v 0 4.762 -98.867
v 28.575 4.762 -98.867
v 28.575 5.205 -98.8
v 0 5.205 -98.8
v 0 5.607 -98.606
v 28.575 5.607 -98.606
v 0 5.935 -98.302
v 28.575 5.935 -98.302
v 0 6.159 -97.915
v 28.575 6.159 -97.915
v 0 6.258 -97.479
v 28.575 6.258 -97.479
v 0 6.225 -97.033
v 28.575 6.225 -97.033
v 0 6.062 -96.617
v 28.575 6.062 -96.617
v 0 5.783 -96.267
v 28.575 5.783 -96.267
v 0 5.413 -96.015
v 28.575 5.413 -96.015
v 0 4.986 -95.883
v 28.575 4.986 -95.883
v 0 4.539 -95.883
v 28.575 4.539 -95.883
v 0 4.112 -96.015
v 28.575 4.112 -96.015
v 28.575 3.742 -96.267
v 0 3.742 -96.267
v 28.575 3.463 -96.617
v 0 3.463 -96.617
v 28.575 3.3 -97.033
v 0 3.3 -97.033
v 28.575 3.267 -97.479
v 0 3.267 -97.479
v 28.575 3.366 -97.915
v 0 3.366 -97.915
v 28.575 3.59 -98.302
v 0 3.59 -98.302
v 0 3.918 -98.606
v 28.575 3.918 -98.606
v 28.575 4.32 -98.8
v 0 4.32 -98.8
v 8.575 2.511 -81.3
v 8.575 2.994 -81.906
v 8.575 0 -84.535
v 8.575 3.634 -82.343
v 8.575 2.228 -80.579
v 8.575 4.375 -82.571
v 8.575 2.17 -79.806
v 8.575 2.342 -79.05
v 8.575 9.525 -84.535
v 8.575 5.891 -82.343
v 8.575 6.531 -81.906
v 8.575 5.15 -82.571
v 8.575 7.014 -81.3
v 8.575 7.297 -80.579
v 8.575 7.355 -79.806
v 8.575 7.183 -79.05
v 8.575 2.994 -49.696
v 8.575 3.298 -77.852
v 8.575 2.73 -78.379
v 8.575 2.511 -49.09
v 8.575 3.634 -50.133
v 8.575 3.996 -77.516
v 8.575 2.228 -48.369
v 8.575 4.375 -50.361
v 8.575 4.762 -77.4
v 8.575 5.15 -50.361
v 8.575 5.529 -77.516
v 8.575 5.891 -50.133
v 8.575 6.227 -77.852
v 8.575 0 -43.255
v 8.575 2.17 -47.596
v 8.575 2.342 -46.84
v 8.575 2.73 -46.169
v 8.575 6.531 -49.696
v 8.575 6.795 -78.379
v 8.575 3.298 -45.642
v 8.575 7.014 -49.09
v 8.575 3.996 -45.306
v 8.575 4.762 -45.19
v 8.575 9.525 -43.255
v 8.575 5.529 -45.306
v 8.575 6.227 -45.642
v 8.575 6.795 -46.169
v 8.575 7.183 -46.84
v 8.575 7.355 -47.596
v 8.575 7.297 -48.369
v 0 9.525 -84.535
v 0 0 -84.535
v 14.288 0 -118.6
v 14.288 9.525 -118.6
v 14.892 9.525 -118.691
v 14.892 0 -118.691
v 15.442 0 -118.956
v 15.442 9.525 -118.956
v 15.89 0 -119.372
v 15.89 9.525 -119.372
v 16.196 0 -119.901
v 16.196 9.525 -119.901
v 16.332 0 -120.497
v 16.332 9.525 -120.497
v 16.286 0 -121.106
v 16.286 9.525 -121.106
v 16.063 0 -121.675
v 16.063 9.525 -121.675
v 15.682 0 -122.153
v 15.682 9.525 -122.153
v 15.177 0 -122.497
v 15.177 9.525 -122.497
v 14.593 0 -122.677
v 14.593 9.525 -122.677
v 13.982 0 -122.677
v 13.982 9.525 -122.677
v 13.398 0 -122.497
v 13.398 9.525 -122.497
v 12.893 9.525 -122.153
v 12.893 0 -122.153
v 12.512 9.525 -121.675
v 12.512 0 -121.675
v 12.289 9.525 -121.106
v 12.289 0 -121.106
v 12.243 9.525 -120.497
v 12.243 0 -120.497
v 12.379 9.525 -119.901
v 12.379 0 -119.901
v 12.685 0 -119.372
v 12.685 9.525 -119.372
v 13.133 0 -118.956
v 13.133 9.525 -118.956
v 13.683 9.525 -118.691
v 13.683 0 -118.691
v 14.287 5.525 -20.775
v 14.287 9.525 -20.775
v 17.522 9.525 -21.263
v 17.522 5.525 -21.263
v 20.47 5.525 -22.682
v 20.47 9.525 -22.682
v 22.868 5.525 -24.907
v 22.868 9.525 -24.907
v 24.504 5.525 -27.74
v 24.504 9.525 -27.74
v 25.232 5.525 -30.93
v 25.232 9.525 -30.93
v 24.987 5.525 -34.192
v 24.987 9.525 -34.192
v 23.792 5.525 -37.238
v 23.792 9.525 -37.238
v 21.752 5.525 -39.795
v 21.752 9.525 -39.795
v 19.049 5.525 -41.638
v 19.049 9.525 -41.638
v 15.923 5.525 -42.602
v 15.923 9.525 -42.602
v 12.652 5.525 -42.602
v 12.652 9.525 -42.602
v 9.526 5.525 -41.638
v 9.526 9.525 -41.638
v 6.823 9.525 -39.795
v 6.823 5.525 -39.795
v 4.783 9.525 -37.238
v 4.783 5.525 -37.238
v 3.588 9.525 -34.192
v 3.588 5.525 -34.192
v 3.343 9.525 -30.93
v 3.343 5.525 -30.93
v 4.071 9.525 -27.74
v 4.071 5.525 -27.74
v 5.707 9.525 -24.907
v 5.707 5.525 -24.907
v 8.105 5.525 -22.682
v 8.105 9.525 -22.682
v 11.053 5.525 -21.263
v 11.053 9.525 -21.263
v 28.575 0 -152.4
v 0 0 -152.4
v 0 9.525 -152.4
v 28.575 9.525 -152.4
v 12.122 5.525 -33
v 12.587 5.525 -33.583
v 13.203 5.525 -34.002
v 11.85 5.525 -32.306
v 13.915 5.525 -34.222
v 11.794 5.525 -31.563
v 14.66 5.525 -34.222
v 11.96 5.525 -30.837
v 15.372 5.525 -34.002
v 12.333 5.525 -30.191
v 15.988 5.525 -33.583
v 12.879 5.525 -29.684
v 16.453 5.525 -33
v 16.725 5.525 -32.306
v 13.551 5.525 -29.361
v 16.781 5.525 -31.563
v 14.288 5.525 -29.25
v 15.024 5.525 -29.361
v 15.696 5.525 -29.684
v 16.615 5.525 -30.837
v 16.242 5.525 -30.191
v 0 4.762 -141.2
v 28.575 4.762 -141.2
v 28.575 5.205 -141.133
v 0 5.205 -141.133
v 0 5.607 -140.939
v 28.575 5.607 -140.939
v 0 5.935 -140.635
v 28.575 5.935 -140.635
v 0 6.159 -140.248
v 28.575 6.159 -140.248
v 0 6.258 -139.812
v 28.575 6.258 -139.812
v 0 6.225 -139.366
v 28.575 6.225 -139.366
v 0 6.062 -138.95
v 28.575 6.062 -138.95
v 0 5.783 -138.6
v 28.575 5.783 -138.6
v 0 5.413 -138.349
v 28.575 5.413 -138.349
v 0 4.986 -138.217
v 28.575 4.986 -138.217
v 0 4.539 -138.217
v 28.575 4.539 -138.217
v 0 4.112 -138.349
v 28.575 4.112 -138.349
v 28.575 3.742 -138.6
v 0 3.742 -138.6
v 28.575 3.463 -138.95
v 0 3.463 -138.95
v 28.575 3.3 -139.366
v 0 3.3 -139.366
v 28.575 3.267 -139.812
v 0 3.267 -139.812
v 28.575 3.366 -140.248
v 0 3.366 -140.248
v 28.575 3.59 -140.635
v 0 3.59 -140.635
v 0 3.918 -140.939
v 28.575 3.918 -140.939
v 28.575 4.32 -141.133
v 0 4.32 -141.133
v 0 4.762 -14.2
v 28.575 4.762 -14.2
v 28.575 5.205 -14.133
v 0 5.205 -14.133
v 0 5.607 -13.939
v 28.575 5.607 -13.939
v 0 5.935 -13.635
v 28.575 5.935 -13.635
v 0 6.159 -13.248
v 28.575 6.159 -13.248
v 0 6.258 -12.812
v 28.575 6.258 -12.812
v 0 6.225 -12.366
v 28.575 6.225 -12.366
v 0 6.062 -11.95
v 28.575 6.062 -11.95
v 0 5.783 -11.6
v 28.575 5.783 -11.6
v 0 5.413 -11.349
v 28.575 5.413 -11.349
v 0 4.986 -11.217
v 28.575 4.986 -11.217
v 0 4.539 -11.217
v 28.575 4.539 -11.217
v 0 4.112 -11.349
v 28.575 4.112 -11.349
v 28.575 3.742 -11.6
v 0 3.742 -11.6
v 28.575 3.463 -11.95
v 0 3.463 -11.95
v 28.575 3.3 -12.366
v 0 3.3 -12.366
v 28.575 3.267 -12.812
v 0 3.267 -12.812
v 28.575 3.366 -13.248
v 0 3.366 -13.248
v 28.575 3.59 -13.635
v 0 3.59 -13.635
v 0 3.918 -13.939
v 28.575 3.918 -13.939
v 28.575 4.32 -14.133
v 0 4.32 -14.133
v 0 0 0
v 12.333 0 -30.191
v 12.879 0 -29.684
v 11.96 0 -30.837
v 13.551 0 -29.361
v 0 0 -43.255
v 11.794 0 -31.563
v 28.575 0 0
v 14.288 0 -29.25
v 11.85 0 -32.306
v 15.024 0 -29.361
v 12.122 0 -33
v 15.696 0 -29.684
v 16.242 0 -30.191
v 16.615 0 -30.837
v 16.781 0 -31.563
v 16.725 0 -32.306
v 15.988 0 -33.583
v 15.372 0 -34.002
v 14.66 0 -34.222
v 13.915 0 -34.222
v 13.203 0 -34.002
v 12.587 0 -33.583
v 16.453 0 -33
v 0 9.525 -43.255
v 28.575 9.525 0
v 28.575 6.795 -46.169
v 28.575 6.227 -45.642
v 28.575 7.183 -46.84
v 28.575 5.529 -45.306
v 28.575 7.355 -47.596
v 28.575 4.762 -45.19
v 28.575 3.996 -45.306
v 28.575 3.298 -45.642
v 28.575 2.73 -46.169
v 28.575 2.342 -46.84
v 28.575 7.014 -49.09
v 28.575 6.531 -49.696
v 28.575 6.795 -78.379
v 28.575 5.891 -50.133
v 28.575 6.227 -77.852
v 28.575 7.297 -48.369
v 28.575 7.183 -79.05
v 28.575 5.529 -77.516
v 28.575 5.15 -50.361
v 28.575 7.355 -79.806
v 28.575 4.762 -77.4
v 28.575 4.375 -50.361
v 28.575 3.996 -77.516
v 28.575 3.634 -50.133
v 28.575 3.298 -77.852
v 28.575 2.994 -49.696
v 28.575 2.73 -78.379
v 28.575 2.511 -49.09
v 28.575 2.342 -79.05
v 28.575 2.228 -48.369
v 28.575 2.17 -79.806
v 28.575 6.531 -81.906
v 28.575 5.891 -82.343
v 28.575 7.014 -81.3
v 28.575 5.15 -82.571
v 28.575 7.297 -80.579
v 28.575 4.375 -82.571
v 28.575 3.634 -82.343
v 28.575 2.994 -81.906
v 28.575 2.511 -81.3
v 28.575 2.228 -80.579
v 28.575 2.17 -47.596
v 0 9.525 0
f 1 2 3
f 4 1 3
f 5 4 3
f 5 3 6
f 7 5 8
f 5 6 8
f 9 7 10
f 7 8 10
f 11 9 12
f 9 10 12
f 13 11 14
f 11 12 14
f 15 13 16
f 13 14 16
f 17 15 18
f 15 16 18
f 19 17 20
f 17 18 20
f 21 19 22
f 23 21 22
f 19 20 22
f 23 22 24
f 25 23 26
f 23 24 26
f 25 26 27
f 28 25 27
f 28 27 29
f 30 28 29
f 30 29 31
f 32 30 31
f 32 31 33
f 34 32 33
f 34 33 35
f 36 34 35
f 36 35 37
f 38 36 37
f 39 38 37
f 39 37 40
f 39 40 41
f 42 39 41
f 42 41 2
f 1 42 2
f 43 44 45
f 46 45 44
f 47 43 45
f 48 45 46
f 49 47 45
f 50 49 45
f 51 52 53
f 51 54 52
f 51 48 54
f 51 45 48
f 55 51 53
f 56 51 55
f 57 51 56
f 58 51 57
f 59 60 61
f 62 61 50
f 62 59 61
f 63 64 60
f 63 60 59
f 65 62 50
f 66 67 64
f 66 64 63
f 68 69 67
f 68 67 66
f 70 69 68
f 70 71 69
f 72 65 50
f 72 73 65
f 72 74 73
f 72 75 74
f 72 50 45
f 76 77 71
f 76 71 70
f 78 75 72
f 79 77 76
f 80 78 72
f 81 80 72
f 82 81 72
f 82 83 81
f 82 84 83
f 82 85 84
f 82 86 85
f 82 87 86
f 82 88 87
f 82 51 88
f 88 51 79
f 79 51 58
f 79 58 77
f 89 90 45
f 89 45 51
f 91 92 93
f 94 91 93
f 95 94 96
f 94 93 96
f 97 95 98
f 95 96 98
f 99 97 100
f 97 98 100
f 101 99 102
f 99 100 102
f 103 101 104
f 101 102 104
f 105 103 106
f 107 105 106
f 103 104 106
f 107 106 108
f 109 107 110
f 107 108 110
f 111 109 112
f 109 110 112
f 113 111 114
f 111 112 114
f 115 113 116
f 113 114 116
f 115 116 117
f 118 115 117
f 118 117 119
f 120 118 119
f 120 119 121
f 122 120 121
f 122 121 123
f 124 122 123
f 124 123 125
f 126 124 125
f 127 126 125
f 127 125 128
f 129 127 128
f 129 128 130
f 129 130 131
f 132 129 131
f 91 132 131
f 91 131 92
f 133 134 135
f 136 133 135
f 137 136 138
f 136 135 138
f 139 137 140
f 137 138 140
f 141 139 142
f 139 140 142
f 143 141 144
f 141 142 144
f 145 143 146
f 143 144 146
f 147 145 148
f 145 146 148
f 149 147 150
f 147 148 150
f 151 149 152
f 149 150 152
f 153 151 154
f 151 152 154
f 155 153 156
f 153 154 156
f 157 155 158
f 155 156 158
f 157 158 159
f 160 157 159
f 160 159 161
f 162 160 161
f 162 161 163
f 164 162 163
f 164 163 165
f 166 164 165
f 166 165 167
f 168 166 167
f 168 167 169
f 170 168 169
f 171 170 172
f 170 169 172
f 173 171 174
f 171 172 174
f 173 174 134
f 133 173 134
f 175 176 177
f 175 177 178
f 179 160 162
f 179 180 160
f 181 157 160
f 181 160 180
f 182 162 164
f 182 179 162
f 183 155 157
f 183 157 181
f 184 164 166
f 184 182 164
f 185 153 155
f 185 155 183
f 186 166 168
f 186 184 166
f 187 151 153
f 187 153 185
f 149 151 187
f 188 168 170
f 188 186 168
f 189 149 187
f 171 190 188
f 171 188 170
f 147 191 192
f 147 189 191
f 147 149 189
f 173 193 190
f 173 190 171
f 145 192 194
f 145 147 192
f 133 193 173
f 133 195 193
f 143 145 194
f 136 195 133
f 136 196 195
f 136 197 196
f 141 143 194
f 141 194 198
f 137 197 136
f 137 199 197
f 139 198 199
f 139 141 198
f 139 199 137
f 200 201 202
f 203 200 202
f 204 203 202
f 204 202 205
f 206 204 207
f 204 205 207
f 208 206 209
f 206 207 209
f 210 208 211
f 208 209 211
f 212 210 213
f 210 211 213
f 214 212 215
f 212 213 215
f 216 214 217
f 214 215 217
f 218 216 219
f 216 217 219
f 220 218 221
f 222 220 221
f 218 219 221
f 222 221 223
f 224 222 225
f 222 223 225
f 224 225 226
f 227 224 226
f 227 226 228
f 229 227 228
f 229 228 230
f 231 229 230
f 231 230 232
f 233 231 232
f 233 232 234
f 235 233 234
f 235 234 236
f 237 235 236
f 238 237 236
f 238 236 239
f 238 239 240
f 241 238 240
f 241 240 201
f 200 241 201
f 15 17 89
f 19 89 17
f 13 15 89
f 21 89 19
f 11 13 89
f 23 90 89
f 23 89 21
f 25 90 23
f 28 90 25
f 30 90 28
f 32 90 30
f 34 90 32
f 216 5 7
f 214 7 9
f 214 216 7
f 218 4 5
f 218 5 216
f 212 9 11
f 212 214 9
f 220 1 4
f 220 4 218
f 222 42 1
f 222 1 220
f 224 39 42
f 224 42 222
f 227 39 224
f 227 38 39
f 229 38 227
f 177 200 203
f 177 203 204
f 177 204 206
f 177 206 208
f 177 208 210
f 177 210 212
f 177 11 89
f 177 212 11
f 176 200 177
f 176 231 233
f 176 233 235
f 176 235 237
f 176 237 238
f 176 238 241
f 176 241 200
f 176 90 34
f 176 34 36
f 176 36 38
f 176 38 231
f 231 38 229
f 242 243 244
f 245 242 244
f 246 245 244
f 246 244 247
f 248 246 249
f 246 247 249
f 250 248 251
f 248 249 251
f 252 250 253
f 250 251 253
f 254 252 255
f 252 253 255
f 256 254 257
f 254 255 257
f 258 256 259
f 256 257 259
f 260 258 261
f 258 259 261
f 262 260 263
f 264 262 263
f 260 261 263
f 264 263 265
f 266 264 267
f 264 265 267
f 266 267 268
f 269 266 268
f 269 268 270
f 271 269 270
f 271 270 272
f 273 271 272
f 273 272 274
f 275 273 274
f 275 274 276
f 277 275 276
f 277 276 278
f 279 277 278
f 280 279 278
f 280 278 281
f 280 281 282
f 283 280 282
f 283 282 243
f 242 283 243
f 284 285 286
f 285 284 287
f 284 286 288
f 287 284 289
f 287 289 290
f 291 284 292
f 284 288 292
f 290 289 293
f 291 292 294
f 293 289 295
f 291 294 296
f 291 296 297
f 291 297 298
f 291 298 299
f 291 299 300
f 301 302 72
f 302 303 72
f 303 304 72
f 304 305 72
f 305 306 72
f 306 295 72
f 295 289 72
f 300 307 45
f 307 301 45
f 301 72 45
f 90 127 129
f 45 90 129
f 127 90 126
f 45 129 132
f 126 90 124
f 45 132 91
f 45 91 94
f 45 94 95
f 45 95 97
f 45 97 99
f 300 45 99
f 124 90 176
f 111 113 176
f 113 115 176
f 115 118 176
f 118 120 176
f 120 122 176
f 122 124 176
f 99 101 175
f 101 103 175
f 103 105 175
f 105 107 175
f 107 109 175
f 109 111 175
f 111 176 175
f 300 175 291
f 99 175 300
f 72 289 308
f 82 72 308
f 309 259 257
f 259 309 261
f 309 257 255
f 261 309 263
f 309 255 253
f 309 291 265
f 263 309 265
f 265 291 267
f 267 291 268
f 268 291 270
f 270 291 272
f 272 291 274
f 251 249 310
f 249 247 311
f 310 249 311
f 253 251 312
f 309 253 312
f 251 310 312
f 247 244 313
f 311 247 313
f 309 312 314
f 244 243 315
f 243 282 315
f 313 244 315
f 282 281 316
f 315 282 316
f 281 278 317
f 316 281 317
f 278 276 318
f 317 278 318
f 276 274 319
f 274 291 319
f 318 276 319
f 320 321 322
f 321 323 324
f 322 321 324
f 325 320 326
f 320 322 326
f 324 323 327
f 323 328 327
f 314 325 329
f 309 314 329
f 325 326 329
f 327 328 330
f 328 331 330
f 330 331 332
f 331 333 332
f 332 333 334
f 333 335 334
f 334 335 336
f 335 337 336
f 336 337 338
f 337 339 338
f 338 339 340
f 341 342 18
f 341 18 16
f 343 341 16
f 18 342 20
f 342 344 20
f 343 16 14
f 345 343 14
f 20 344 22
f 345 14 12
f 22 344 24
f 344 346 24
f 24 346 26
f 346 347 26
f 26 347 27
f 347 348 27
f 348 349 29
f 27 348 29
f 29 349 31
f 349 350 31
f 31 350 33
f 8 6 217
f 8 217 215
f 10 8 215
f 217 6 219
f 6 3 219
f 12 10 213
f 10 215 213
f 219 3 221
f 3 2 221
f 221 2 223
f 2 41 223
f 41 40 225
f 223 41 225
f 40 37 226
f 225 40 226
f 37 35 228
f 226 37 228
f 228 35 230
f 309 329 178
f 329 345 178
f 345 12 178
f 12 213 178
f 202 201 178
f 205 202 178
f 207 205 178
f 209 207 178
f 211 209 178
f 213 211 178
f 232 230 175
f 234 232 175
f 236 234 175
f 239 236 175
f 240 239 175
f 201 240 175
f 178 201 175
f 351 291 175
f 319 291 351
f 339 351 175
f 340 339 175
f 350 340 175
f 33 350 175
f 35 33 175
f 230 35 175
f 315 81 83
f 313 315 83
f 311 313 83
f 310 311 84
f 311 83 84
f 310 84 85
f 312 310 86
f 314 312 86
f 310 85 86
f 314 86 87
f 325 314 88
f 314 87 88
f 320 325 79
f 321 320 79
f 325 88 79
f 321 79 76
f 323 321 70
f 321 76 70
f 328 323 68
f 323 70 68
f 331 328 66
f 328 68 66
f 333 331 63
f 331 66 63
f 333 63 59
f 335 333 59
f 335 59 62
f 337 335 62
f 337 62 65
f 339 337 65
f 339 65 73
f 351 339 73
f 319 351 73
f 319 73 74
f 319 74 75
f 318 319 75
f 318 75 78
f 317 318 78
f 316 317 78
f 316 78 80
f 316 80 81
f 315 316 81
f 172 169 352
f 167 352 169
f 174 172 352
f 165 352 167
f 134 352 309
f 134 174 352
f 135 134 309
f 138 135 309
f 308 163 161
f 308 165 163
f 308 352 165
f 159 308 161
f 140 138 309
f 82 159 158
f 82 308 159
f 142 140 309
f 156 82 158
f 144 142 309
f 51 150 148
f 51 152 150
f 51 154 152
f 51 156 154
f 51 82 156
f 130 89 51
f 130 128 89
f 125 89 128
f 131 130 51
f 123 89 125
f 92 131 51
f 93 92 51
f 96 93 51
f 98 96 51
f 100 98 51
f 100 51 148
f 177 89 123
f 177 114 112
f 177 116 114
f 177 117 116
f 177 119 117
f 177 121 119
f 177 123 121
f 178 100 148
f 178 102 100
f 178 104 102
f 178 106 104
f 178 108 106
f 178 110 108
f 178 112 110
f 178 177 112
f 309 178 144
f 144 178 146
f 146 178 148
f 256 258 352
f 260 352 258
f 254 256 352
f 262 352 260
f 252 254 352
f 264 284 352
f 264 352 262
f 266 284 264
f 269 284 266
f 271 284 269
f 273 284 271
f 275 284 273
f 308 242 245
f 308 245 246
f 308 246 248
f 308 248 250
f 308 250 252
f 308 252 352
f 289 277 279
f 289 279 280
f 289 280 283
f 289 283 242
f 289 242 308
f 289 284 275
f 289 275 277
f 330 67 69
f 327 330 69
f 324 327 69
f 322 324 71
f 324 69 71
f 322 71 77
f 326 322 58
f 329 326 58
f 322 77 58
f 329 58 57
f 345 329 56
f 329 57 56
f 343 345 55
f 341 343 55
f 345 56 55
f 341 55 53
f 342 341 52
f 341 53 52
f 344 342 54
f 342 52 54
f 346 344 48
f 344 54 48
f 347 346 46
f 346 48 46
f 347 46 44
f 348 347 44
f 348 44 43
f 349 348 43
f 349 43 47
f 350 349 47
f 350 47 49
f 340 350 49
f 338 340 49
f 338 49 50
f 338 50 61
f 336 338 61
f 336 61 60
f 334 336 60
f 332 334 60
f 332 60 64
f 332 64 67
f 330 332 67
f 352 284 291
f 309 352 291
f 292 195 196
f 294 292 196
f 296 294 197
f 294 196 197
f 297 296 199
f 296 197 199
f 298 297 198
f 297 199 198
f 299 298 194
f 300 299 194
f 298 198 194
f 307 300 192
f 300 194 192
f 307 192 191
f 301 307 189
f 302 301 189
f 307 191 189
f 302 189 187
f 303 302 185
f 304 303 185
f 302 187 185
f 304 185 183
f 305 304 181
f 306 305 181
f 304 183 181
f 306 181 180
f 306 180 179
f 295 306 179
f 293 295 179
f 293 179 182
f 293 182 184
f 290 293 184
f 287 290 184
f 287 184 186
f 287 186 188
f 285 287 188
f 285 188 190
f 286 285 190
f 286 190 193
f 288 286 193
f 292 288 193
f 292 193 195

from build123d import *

# Parameters (mm, degrees)
SKETCH2_W             = 28.575
SKETCH2_H             = 152.4
BOSS_EXTRUDE1_DEPTH   = 9.525
F_3_0MM_DOWEL_HOLE1_D = 3
LPATTERN1_COUNT       = 4
LPATTERN1_PITCH       = 42.333333333
SKETCH12_R            = 2.05
CUT_EXTRUDE1_DEPTH    = 156.348048749
SKETCH12_4_R          = 10.975
CUT_EXTRUDE2_DEPTH    = 4
SKETCH15_R            = 2.5
CUT_EXTRUDE3_DEPTH    = 156.154169296
SKETCH13_R            = 2.6
CUT_EXTRUDE4_DEPTH    = 156.348048749
SKETCH17_W            = 41.28
SKETCH17_H            = 9.525
CUT_EXTRUDE5_DEPTH    = 8.575


with BuildPart() as part:
    # Sketch2 → Boss-Extrude1 (new body)
    with BuildSketch(Plane(origin=(0, 0, 0), x_dir=(1, 0, 0), z_dir=(0, 1, 0))):
        with Locations((14.2875, 76.2)):
            Rectangle(SKETCH2_W, SKETCH2_H)
    extrude(amount=BOSS_EXTRUDE1_DEPTH)

    # Ø3.0mm Dowel Hole1 (through all)
    with Locations(Plane.ZY):
        with Locations((-139.7, 4.7625)):
            f_3_0mm_dowel_hole1 = Hole(F_3_0MM_DOWEL_HOLE1_D / 2)

    # LPattern1: Ø3.0mm Dowel Hole1 ×4, 1 skipped
    with Locations(*[(0, 0, i * LPATTERN1_PITCH) for i in range(1, LPATTERN1_COUNT) if i not in (2,)]):
        add(f_3_0mm_dowel_hole1, mode=Mode.SUBTRACT)

    # Sketch12 → Cut-Extrude1 (cut, through all)
    with BuildSketch(Plane(origin=(0, 9.525, 0), x_dir=(1, 0, 0), z_dir=(0, 1, 0))):
        with Locations(Location((14.2875, 120.65, 0), (0, 0, 270))):
            Circle(SKETCH12_R)
    extrude(amount=-CUT_EXTRUDE1_DEPTH, mode=Mode.SUBTRACT)

    # Sketch12<4> → Cut-Extrude2 (cut)
    with BuildSketch(Plane(origin=(0, 9.525, 0), x_dir=(1, 0, 0), z_dir=(0, 1, 0))):
        with Locations(Location((14.2875, 31.75, 0), (0, 0, 270))):
            Circle(SKETCH12_4_R)
    extrude(amount=-CUT_EXTRUDE2_DEPTH, mode=Mode.SUBTRACT)

    # Sketch15 → Cut-Extrude3 (cut, through all)
    with BuildSketch(Plane(origin=(0, 5.525, 0), x_dir=(1, 0, 0), z_dir=(0, 1, 0))):
        with Locations(Location((14.2875, 31.75, 0), (0, 0, 270))):
            Circle(SKETCH15_R)
    extrude(amount=-CUT_EXTRUDE3_DEPTH, mode=Mode.SUBTRACT)

    # Sketch13 → Cut-Extrude4 (cut, through all)
    with BuildSketch(Plane.ZY):
        with Locations((-80, 4.7625)):
            Circle(SKETCH13_R)
        with Locations((-47.79, 4.7625)):
            Circle(SKETCH13_R)
    extrude(amount=-CUT_EXTRUDE4_DEPTH, mode=Mode.SUBTRACT)

    # Sketch17 → Cut-Extrude5 (cut)
    with BuildSketch(Plane.ZY):
        with Locations((-63.895, 4.7625)):
            Rectangle(SKETCH17_W, SKETCH17_H)
    extrude(amount=-CUT_EXTRUDE5_DEPTH, mode=Mode.SUBTRACT)


solid = part.part
